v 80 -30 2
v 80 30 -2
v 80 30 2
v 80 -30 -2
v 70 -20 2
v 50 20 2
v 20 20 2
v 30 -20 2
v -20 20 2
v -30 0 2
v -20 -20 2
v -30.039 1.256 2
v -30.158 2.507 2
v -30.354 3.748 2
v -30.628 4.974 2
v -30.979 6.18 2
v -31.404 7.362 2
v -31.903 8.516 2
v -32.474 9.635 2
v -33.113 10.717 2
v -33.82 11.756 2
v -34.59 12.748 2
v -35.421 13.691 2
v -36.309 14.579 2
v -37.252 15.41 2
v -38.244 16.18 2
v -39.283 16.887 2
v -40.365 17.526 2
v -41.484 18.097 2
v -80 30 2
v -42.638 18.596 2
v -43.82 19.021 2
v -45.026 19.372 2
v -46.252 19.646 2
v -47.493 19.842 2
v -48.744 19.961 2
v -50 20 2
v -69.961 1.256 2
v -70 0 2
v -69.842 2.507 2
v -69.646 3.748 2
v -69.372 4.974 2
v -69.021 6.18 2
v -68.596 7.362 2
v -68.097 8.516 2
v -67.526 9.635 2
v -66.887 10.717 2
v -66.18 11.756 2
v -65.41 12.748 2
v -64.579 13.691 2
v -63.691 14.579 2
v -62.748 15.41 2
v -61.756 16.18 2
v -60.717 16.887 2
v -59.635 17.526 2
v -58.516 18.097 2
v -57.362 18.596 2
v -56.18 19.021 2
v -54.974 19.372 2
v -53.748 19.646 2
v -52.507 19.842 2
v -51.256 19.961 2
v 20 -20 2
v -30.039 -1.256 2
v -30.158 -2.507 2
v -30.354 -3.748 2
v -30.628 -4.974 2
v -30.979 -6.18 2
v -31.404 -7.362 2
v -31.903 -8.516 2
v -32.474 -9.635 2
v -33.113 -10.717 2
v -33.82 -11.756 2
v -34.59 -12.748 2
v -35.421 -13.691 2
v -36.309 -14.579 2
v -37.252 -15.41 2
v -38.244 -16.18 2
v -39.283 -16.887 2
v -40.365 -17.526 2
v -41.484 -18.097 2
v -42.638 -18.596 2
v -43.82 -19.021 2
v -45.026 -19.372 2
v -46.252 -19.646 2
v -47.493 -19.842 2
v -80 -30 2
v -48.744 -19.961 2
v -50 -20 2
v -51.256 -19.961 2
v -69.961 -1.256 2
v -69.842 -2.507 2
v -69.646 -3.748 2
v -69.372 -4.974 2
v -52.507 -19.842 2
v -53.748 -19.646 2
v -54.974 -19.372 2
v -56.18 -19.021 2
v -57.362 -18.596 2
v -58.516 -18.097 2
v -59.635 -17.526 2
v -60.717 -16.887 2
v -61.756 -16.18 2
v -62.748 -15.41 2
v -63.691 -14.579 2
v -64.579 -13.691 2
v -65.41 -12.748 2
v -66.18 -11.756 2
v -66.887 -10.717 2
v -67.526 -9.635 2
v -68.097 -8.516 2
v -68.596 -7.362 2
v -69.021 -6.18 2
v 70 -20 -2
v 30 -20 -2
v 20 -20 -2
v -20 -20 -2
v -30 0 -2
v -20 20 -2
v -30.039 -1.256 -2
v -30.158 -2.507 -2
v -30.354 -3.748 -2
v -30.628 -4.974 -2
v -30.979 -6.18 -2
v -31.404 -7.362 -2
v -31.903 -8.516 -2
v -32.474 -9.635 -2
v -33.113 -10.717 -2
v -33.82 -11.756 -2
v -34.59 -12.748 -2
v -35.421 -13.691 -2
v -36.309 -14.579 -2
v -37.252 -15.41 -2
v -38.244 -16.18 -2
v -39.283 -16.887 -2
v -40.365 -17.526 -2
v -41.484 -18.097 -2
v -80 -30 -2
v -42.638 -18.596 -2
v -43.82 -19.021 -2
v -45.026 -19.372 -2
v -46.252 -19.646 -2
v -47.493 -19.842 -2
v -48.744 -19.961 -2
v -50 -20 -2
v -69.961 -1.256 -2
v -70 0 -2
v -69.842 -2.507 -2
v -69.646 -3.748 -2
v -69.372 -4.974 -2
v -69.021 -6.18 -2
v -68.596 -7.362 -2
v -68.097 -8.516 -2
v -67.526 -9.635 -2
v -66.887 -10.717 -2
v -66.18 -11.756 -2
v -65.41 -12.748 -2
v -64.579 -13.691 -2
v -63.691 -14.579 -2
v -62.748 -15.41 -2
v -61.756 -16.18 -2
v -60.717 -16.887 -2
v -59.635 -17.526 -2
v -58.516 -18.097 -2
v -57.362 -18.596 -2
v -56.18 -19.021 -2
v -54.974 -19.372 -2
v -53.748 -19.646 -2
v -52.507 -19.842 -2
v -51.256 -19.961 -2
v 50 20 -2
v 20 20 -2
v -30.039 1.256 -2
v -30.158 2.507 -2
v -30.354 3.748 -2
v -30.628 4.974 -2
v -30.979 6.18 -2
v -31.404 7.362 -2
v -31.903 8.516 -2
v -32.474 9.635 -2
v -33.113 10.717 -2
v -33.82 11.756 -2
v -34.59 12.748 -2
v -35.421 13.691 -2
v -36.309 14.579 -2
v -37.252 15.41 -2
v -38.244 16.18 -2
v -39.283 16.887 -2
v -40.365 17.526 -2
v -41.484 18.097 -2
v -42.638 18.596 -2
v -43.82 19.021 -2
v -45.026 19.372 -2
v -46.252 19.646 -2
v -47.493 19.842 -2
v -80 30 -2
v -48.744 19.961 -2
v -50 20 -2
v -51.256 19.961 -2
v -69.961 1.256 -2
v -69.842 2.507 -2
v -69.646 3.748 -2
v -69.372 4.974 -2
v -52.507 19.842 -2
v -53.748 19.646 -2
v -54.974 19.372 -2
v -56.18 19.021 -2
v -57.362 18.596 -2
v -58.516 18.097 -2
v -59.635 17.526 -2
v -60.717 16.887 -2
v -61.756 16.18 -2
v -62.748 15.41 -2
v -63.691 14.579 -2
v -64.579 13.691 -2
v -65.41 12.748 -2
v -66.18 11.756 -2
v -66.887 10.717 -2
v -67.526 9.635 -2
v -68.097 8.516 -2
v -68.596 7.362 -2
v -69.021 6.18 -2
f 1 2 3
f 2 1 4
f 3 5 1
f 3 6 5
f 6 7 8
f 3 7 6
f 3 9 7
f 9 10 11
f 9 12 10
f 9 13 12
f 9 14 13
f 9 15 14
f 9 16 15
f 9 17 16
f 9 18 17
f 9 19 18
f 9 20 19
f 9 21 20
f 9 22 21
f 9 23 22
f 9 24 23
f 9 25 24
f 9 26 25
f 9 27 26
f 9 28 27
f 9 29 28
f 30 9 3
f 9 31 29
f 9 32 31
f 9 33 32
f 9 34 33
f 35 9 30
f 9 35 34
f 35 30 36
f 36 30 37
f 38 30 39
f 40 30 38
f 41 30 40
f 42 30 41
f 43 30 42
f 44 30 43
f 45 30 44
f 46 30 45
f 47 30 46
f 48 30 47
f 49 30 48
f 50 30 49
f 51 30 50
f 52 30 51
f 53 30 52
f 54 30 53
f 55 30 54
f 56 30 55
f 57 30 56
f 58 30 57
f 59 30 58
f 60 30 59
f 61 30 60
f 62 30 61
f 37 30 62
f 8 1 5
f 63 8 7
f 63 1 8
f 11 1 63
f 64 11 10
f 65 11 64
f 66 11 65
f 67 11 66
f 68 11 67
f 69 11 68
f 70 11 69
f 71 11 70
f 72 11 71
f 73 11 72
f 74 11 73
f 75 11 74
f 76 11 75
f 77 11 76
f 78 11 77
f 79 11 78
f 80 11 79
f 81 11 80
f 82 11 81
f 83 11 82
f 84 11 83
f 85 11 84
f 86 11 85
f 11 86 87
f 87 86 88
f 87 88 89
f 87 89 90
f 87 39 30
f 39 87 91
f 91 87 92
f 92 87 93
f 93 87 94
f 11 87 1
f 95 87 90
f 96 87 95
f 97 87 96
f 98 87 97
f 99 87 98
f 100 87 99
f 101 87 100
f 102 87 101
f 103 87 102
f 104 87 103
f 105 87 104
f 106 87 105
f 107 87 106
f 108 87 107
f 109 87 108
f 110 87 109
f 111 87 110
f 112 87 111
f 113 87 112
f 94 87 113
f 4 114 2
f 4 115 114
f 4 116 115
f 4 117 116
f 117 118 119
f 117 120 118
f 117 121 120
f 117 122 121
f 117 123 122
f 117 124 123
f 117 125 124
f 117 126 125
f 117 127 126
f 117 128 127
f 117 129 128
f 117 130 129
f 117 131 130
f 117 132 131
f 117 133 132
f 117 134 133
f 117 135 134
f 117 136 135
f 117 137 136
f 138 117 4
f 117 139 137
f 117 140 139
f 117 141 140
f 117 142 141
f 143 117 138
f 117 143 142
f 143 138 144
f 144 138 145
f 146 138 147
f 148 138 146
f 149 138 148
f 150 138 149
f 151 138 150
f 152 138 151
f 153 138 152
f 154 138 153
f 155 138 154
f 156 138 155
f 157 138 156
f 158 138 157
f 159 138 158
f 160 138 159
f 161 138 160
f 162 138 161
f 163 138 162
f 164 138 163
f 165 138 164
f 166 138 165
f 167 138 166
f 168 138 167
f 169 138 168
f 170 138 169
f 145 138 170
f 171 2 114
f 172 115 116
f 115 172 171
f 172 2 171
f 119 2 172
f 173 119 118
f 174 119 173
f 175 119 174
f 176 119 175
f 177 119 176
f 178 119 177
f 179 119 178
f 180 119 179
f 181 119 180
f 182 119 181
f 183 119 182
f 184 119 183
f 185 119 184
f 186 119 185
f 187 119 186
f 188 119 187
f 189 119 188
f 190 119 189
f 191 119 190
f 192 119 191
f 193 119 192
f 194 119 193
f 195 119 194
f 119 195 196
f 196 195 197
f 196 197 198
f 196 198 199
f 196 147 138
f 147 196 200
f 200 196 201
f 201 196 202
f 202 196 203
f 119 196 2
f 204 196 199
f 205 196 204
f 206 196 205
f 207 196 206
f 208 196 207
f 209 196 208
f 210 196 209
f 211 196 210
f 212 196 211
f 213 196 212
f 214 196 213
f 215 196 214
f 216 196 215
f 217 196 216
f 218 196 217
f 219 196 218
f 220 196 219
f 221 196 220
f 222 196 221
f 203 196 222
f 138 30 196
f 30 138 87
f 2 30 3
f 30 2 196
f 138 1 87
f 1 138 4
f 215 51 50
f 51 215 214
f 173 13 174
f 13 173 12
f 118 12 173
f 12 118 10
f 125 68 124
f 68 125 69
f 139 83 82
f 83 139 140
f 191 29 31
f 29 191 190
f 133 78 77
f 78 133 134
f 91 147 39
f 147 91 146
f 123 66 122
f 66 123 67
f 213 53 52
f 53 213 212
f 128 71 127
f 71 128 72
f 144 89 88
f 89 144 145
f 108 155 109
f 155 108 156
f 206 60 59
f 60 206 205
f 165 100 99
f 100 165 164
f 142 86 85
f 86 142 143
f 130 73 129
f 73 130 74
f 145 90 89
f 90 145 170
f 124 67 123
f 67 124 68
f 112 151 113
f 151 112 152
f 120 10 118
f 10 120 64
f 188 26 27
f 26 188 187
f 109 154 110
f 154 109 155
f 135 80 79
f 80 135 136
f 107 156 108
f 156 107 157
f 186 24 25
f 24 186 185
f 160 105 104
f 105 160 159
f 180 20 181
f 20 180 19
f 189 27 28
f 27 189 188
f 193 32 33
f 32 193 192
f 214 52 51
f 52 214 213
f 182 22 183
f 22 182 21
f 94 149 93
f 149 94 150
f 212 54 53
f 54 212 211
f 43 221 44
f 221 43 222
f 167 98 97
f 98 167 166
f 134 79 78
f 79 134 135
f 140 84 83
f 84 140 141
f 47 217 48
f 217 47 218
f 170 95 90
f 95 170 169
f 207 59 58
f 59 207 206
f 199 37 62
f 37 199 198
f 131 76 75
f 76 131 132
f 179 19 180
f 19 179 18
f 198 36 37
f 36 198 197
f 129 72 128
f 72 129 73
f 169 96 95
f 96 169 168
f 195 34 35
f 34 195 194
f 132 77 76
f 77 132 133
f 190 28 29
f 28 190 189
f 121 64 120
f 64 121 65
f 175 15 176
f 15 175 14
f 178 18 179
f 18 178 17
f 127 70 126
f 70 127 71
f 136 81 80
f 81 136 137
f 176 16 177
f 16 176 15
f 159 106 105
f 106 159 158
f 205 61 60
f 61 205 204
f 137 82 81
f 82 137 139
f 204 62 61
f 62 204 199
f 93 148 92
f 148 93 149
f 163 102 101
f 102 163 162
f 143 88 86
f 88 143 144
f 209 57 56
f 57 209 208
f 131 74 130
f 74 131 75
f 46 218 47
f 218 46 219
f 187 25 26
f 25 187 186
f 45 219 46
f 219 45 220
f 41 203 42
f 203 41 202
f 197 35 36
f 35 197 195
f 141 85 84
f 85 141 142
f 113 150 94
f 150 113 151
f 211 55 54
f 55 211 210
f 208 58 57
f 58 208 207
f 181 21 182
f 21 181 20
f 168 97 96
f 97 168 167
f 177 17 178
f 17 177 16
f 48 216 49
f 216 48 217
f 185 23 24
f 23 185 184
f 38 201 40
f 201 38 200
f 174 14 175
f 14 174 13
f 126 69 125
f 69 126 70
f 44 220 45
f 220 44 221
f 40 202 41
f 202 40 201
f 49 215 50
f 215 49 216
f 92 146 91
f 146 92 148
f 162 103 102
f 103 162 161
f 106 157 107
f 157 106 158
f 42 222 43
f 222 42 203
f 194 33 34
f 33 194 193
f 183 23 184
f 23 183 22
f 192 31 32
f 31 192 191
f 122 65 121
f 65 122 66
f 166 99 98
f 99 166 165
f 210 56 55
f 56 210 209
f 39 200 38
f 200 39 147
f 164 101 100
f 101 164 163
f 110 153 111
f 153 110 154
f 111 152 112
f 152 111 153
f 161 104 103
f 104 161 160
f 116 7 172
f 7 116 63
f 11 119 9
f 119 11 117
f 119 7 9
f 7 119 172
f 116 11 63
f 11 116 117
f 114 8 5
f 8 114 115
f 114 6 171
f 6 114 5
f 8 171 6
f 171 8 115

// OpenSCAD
shape_width = 40;
gap_width = 10;

difference (){
    cube([(3*shape_width + 4*gap_width), shape_width + 2*gap_width, 4], center=true);

    translate ([-(shape_width + gap_width),0,0]) 
    cylinder (h = 15, r = shape_width/2, $fn=100, center=true);

    cube([shape_width, shape_width, 15], center=true); 
     
    translate([0, 0, -15])
    linear_extrude(25)
    polygon(points=[[30, -20],[50, 20],[70, -20]]);
}
